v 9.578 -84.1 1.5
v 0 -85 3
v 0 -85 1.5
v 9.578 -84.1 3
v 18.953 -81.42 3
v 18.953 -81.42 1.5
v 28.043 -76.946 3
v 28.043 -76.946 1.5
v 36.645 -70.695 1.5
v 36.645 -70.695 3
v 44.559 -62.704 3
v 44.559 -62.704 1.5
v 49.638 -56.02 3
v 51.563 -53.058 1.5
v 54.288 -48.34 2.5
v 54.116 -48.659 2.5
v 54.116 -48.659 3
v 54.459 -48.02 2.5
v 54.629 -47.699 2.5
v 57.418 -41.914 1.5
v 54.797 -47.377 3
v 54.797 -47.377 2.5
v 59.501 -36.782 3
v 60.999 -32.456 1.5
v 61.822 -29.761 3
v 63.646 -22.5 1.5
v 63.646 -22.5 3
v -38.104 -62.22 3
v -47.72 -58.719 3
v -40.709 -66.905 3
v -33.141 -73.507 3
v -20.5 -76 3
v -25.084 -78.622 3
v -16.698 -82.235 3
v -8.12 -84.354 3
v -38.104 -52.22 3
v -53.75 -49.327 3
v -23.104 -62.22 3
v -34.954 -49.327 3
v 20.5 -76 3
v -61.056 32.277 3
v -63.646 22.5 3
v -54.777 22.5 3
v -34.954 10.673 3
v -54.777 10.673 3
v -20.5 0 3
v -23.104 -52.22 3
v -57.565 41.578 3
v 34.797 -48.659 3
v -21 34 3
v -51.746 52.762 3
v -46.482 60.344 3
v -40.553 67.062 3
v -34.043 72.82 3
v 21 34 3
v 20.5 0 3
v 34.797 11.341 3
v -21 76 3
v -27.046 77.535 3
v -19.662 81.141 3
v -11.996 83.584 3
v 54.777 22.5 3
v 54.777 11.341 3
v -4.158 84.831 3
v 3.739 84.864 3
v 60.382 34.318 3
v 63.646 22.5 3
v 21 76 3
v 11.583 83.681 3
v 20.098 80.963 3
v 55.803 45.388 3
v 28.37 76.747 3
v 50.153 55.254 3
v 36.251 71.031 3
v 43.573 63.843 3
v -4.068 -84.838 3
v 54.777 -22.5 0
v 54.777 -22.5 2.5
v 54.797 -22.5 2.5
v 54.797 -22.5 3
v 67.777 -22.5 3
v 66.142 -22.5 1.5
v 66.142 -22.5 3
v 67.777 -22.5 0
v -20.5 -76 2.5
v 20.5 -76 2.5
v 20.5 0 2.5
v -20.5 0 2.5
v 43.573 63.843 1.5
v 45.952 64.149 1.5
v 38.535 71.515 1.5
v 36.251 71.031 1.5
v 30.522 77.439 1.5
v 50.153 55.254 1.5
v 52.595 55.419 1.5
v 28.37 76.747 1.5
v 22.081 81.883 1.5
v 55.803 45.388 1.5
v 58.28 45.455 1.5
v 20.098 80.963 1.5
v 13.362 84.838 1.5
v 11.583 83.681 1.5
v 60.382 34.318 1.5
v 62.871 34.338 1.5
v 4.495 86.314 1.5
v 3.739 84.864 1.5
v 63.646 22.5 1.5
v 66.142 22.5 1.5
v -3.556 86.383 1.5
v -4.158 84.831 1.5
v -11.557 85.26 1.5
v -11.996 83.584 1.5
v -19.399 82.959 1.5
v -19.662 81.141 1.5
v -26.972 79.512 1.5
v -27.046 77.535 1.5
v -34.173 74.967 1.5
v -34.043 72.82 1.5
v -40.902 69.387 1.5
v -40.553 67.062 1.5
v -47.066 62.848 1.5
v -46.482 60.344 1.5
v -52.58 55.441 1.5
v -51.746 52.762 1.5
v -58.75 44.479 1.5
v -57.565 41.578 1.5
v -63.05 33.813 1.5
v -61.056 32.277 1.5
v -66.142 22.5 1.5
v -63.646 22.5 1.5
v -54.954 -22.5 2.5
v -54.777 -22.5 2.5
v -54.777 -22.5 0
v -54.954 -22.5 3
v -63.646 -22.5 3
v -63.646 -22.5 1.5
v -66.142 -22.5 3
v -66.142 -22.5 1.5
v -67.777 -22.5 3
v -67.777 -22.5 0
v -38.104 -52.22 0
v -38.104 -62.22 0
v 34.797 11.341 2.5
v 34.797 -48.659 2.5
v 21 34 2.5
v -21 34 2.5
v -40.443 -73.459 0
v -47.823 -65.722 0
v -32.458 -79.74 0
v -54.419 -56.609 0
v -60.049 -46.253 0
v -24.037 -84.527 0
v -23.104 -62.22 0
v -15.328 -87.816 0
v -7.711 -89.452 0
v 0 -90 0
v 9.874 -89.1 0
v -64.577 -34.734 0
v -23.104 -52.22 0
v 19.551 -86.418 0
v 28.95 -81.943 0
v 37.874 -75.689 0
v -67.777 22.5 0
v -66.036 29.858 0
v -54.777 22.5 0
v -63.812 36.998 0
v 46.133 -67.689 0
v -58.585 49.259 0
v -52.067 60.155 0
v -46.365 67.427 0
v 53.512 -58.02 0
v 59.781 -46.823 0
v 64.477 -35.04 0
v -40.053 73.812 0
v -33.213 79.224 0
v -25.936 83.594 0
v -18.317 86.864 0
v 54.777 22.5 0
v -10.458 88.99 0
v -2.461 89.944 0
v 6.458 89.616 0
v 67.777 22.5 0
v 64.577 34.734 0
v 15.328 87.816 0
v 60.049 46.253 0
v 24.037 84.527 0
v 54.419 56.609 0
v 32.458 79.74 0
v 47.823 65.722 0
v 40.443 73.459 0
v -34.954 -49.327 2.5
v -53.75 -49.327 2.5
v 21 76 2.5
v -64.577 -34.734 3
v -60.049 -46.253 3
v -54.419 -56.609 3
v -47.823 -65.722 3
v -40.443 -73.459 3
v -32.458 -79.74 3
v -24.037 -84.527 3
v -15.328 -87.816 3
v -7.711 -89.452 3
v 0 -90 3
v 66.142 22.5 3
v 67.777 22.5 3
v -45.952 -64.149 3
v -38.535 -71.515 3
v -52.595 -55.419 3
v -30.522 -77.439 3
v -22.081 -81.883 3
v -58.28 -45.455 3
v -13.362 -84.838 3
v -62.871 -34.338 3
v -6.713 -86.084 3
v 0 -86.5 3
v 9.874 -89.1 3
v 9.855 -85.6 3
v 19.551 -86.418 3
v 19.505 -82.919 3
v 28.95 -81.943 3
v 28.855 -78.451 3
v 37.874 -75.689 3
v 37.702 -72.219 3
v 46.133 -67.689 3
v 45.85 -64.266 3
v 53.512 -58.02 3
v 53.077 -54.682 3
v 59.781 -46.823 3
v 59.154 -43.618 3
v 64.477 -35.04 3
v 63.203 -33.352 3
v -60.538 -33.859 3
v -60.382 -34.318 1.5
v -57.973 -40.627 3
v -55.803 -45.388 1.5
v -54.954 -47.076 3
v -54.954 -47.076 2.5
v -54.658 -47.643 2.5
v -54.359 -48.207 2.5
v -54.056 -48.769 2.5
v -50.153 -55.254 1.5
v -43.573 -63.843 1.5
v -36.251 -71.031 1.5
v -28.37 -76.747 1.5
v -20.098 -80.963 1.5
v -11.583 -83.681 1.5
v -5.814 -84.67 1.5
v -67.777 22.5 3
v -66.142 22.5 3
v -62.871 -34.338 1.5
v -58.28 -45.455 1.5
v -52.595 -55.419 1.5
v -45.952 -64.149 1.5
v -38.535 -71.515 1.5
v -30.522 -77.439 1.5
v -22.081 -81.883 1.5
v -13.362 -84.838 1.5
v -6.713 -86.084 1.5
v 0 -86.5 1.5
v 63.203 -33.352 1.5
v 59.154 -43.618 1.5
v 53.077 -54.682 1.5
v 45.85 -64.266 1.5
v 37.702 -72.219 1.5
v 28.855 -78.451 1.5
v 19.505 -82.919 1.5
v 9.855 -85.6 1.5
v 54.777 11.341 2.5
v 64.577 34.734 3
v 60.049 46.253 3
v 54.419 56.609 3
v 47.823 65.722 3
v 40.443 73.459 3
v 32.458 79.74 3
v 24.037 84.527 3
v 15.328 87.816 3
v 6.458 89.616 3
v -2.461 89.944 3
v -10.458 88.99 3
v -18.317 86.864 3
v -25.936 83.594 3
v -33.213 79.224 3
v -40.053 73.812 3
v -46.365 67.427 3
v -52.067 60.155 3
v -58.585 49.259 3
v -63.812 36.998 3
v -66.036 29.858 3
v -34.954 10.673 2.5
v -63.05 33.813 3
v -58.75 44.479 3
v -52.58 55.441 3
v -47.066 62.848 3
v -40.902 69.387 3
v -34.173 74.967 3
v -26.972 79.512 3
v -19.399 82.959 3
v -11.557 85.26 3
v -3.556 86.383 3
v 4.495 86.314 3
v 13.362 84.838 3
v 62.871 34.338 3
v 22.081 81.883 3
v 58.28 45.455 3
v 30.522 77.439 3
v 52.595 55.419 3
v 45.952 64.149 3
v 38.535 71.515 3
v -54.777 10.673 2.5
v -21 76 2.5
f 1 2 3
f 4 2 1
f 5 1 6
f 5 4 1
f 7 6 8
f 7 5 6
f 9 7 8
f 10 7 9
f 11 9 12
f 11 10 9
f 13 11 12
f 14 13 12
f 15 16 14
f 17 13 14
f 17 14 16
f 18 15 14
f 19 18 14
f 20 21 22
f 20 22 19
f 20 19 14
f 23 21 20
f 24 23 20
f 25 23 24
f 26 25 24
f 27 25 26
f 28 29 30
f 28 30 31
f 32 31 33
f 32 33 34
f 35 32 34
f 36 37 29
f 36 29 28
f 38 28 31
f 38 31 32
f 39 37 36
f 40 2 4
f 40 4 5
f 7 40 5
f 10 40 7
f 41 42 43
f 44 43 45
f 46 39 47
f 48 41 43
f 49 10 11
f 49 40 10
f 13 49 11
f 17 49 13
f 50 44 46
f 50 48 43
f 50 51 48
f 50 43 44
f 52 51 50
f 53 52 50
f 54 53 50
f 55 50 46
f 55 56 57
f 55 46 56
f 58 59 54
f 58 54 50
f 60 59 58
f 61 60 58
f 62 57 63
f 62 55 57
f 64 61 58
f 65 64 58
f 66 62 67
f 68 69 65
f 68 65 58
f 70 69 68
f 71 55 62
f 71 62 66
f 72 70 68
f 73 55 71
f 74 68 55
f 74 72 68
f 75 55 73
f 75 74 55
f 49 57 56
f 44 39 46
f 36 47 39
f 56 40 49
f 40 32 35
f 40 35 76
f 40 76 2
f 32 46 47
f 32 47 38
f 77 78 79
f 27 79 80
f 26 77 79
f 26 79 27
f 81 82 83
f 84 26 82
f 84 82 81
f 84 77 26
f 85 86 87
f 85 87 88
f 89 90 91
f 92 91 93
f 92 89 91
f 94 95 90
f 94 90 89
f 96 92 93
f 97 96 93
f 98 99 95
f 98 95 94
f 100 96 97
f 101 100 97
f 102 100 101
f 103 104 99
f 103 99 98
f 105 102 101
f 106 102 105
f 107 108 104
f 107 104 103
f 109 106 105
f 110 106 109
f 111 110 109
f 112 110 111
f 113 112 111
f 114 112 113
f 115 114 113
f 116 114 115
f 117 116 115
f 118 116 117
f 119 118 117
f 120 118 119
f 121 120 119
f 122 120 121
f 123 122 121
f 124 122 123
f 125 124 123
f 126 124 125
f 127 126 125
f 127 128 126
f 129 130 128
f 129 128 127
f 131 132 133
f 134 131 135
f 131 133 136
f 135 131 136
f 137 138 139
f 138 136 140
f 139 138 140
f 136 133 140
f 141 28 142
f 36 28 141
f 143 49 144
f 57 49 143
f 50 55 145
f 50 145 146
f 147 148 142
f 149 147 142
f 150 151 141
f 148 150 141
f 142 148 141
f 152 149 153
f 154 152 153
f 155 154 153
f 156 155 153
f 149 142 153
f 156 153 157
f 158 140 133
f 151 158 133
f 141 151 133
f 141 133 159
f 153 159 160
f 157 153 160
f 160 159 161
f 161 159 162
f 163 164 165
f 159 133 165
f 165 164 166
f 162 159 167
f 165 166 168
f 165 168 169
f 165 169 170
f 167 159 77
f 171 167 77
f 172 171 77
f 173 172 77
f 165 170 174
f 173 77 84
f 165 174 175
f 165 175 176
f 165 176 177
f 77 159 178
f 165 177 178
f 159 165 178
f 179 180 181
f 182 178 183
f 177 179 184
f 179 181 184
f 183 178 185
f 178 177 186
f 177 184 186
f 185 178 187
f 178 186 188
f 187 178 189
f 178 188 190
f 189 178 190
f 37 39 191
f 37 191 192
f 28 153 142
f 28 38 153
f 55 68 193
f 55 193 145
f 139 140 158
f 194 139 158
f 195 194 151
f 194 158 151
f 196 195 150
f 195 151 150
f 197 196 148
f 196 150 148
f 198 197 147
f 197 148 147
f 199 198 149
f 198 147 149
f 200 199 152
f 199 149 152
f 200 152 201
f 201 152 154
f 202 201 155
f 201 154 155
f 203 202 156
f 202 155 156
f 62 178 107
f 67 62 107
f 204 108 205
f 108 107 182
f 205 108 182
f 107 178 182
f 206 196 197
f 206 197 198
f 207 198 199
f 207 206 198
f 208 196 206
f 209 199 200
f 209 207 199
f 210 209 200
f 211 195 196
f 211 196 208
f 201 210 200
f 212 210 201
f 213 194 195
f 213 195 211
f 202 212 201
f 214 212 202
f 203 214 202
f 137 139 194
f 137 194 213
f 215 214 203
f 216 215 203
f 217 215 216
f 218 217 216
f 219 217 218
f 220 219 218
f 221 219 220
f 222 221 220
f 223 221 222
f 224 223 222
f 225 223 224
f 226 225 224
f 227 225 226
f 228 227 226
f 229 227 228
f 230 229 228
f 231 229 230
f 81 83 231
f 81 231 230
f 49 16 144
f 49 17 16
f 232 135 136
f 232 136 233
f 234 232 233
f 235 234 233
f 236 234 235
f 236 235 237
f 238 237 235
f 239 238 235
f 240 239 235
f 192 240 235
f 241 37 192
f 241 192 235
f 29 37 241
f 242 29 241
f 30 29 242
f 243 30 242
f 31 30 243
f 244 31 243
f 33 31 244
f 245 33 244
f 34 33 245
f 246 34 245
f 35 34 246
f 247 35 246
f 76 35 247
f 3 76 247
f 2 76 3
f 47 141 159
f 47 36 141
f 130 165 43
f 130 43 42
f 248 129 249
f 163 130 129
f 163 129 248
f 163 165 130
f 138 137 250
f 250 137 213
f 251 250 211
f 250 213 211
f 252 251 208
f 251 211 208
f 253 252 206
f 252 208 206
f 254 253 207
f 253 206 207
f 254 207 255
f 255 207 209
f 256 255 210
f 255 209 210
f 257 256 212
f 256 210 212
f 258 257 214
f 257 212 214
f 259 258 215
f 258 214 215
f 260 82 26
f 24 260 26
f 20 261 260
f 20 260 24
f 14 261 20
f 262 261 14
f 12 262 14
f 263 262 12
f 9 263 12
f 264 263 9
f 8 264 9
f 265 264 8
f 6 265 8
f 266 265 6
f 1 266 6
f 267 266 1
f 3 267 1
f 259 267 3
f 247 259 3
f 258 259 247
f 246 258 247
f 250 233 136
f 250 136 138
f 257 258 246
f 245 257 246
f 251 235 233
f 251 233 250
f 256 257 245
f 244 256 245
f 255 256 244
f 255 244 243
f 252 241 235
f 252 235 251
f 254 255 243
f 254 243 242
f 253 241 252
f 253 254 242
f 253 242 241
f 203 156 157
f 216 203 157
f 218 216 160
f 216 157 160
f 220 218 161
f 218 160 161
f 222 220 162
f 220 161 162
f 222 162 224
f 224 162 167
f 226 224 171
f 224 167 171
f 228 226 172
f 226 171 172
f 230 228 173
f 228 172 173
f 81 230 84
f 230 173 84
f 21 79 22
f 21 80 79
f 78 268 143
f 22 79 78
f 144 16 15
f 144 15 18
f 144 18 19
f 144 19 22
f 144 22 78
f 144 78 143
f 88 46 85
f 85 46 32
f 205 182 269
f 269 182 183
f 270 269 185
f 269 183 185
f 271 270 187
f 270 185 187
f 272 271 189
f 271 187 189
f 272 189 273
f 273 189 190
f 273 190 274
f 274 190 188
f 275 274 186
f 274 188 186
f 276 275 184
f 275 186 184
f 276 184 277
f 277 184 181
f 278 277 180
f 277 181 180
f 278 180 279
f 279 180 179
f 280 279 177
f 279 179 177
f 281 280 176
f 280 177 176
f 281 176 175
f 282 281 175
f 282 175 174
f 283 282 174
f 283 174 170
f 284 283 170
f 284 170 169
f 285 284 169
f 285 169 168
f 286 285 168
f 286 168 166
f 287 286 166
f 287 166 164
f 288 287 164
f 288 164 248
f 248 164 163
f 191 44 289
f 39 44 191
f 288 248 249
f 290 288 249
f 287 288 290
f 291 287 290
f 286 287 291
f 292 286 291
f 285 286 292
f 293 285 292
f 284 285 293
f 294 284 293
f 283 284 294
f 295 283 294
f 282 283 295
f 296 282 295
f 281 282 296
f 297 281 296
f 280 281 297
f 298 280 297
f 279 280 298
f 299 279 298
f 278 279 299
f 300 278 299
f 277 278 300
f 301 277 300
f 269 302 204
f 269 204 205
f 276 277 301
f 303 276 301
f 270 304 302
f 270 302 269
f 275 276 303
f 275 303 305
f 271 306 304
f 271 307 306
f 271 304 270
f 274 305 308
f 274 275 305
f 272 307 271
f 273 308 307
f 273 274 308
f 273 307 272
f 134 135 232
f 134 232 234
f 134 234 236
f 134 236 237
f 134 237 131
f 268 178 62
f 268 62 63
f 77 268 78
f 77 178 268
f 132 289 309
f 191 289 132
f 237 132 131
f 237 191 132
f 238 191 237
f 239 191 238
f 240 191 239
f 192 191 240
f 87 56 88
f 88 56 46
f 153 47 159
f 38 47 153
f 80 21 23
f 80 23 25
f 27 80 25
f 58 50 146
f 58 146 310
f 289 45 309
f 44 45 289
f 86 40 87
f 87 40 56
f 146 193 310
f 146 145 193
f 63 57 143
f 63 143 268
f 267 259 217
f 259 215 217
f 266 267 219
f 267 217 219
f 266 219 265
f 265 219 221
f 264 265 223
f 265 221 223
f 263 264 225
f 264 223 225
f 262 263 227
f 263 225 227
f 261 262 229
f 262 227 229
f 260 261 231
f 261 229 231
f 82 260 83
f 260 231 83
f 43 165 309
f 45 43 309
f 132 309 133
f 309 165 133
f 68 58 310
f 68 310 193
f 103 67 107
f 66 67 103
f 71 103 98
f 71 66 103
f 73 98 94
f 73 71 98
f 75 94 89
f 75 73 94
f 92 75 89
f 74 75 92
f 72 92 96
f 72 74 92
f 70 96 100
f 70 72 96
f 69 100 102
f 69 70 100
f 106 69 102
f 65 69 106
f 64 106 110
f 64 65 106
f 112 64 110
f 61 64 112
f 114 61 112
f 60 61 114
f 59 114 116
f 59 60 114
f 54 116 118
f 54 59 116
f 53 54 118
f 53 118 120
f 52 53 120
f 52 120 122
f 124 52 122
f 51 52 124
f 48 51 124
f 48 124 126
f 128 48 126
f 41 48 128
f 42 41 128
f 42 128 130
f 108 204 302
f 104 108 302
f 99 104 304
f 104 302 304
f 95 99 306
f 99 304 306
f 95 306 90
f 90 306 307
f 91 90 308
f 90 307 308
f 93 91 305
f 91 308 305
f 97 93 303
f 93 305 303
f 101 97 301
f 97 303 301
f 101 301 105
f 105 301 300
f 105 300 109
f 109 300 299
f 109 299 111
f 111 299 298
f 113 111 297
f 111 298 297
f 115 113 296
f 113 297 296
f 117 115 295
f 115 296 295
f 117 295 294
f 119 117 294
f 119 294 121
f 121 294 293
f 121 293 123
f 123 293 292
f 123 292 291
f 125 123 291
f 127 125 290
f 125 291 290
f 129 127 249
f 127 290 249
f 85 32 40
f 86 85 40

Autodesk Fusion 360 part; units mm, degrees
sketch "Sketch1" plane through (0, 0, 0) normal (0, 0, 1) x (1, 0, 0)
  line L0 (-54.7772, 22.5) -> (-54.7772, -22.5)
  line L1 (-54.7772, -22.5) -> (-67.7772, -22.5)
  ellipse E0 centre (0, 0) end of major axis (-70, 0) minor radius 90
  line L2 (70, 0) -> (-70, 0) construction
  line L3 (-54.7772, 22.5) -> (-67.7772, 22.5)
  line L4 (0, 0) -> (70, 0) construction
  line L5 (0, 0) -> (0, 90) construction
  line L6 (54.7772, 22.5) -> (54.7772, -22.5)
  line L7 (54.7772, -22.5) -> (67.7772, -22.5)
  line L8 (54.7772, 22.5) -> (67.7772, 22.5)
  dimension "d2" = 45
  dimension "d29" = 13
  dimension "d30" = 70
  dimension "d31" = 90
  dimension "d32" = 13
extrude "Extrude1" add sketch "Sketch1" along normal blind 3 contours L0 L1 E0 L3 L6 L7 L8
sketch "Sketch2" plane through (0, 0, 3) normal (0, 0, 1) x (-1, 0, 0)
  line L0 (54.7772, -22.5) -> (54.7772, 22.5)
  line L1 (67.7772, -22.5) -> (54.7772, -22.5)
  ellipse E0 centre (0, 0) end of major axis (0, 90) minor radius 70 (-67.7772, -22.5) -> (67.7772, -22.5) ccw
  line L2 (54.7772, 22.5) -> (67.7772, 22.5)
  line L3 (-54.7772, 22.5) -> (-54.7772, -22.5)
  line L4 (-54.7772, -22.5) -> (-67.7772, -22.5)
  ellipse E1 centre (0, 0) end of major axis (0, 90) minor radius 70 (67.7772, 22.5) -> (-67.7772, 22.5) ccw
  line L5 (-67.7772, 22.5) -> (-54.7772, 22.5)
  ellipse E2 centre (0, 0) end of major axis (68.5, 0) minor radius 86.5
  line L6 (-68.5, 0) -> (68.5, 0) construction
  line L7 (0, -86.5) -> (0, 86.5) construction
  ellipse E3 centre (0, 0) end of major axis (66, 0) minor radius 85
  line L8 (-66, 0) -> (66, 0) construction
  line L9 (0, -85) -> (0, 85) construction
  dimension "d33" = 137
  dimension "d34" = 173
  dimension "d35" = 132
  dimension "d36" = 170
extrude "Extrude2" cut sketch "Sketch2" against normal blind 1.5 contours L1 L2 E2 E3 | L1 L4 E2 E3 | L2 L5 E2 E3 | L4 L5 E2 E3
sketch "Sketch3" plane through (0, 0, 3) normal (0, 0, 1) x (-1, 0, 0)
  line L0 (21, -76) -> (-21, -76)
  line L1 (-21, -76) -> (-21, -34)
  line L2 (-21, -34) -> (21, -34)
  line L3 (21, -34) -> (21, -76)
  line L4 (63.6457, -22.5) -> (54.7772, -22.5)
  line L5 (54.7772, 22.5) -> (63.6457, 22.5)
  line L6 (54.7772, -22.5) -> (54.7772, 22.5)
  line L7 (-54.7772, 22.5) -> (-54.7772, -22.5)
  line L8 (-54.7772, -22.5) -> (-63.6457, -22.5)
  line L9 (-63.6457, 22.5) -> (-54.7772, 22.5)
  ellipse E0 centre (0, 0) end of major axis (0, 85) minor radius 66 (63.6457, 22.5) -> (-63.6457, 22.5) ccw
  ellipse E1 centre (0, 0) end of major axis (0, 85) minor radius 66 (-63.6457, -22.5) -> (63.6457, -22.5) ccw
  line L10 (-34.7974, -11.3414) -> (-54.7974, -11.3414)
  line L11 (-54.7974, -11.3414) -> (-54.7974, 48.6586)
  line L12 (-54.7974, 48.6586) -> (-34.7974, 48.6586)
  line L13 (-34.7974, 48.6586) -> (-34.7974, -11.3414)
  line L14 (54.9535, -10.6734) -> (34.9535, -10.6734)
  line L15 (34.9535, -10.6734) -> (34.9535, 49.3266)
  line L16 (34.9535, 49.3266) -> (54.9535, 49.3266)
  line L17 (54.9535, 49.3266) -> (54.9535, -10.6734)
  line L18 (-20.5, 0) -> (20.5, 0)
  line L19 (20.5, 0) -> (20.5, 76)
  line L20 (20.5, 76) -> (-20.5, 76)
  line L21 (-20.5, 76) -> (-20.5, 0)
  line L22 (38.1039, 52.22) -> (23.1039, 52.22)
  line L23 (23.1039, 52.22) -> (23.1039, 62.22)
  line L24 (23.1039, 62.22) -> (38.1039, 62.22)
  line L25 (38.1039, 62.22) -> (38.1039, 52.22)
  circle A0 centre (162.6967, 56.966) radius 52
  line L26 (0, 0) -> (0, 100)
  dimension "d21" = 42
  dimension "d22" = 42
  dimension "d37" = 20
  dimension "d38" = 60
  dimension "d39" = 20
  dimension "d40" = 60
  dimension "d41" = 41
  dimension "d42" = 76
  dimension "d43" = 15
  dimension "d44" = 10
  dimension "d45" = 104
  dimension "d46" = 100
  dimension "d47" = 20.5
  dimension "d48" = 21
  dimension "d49" = 34
extrude "Extrude3" cut sketch "Sketch3" against normal blind 0.5 contours L0 L1 L2 L3 | L18 L19 L20 L26 | L18 L20 L21 L26 | L5 L6 E0 L14 L15 L16 L17 | L7 L9 E0 L10 L11 L12 L13
extrude "Extrude4" cut sketch "Sketch3" against normal blind 3 contours L22 L23 L24 L25
